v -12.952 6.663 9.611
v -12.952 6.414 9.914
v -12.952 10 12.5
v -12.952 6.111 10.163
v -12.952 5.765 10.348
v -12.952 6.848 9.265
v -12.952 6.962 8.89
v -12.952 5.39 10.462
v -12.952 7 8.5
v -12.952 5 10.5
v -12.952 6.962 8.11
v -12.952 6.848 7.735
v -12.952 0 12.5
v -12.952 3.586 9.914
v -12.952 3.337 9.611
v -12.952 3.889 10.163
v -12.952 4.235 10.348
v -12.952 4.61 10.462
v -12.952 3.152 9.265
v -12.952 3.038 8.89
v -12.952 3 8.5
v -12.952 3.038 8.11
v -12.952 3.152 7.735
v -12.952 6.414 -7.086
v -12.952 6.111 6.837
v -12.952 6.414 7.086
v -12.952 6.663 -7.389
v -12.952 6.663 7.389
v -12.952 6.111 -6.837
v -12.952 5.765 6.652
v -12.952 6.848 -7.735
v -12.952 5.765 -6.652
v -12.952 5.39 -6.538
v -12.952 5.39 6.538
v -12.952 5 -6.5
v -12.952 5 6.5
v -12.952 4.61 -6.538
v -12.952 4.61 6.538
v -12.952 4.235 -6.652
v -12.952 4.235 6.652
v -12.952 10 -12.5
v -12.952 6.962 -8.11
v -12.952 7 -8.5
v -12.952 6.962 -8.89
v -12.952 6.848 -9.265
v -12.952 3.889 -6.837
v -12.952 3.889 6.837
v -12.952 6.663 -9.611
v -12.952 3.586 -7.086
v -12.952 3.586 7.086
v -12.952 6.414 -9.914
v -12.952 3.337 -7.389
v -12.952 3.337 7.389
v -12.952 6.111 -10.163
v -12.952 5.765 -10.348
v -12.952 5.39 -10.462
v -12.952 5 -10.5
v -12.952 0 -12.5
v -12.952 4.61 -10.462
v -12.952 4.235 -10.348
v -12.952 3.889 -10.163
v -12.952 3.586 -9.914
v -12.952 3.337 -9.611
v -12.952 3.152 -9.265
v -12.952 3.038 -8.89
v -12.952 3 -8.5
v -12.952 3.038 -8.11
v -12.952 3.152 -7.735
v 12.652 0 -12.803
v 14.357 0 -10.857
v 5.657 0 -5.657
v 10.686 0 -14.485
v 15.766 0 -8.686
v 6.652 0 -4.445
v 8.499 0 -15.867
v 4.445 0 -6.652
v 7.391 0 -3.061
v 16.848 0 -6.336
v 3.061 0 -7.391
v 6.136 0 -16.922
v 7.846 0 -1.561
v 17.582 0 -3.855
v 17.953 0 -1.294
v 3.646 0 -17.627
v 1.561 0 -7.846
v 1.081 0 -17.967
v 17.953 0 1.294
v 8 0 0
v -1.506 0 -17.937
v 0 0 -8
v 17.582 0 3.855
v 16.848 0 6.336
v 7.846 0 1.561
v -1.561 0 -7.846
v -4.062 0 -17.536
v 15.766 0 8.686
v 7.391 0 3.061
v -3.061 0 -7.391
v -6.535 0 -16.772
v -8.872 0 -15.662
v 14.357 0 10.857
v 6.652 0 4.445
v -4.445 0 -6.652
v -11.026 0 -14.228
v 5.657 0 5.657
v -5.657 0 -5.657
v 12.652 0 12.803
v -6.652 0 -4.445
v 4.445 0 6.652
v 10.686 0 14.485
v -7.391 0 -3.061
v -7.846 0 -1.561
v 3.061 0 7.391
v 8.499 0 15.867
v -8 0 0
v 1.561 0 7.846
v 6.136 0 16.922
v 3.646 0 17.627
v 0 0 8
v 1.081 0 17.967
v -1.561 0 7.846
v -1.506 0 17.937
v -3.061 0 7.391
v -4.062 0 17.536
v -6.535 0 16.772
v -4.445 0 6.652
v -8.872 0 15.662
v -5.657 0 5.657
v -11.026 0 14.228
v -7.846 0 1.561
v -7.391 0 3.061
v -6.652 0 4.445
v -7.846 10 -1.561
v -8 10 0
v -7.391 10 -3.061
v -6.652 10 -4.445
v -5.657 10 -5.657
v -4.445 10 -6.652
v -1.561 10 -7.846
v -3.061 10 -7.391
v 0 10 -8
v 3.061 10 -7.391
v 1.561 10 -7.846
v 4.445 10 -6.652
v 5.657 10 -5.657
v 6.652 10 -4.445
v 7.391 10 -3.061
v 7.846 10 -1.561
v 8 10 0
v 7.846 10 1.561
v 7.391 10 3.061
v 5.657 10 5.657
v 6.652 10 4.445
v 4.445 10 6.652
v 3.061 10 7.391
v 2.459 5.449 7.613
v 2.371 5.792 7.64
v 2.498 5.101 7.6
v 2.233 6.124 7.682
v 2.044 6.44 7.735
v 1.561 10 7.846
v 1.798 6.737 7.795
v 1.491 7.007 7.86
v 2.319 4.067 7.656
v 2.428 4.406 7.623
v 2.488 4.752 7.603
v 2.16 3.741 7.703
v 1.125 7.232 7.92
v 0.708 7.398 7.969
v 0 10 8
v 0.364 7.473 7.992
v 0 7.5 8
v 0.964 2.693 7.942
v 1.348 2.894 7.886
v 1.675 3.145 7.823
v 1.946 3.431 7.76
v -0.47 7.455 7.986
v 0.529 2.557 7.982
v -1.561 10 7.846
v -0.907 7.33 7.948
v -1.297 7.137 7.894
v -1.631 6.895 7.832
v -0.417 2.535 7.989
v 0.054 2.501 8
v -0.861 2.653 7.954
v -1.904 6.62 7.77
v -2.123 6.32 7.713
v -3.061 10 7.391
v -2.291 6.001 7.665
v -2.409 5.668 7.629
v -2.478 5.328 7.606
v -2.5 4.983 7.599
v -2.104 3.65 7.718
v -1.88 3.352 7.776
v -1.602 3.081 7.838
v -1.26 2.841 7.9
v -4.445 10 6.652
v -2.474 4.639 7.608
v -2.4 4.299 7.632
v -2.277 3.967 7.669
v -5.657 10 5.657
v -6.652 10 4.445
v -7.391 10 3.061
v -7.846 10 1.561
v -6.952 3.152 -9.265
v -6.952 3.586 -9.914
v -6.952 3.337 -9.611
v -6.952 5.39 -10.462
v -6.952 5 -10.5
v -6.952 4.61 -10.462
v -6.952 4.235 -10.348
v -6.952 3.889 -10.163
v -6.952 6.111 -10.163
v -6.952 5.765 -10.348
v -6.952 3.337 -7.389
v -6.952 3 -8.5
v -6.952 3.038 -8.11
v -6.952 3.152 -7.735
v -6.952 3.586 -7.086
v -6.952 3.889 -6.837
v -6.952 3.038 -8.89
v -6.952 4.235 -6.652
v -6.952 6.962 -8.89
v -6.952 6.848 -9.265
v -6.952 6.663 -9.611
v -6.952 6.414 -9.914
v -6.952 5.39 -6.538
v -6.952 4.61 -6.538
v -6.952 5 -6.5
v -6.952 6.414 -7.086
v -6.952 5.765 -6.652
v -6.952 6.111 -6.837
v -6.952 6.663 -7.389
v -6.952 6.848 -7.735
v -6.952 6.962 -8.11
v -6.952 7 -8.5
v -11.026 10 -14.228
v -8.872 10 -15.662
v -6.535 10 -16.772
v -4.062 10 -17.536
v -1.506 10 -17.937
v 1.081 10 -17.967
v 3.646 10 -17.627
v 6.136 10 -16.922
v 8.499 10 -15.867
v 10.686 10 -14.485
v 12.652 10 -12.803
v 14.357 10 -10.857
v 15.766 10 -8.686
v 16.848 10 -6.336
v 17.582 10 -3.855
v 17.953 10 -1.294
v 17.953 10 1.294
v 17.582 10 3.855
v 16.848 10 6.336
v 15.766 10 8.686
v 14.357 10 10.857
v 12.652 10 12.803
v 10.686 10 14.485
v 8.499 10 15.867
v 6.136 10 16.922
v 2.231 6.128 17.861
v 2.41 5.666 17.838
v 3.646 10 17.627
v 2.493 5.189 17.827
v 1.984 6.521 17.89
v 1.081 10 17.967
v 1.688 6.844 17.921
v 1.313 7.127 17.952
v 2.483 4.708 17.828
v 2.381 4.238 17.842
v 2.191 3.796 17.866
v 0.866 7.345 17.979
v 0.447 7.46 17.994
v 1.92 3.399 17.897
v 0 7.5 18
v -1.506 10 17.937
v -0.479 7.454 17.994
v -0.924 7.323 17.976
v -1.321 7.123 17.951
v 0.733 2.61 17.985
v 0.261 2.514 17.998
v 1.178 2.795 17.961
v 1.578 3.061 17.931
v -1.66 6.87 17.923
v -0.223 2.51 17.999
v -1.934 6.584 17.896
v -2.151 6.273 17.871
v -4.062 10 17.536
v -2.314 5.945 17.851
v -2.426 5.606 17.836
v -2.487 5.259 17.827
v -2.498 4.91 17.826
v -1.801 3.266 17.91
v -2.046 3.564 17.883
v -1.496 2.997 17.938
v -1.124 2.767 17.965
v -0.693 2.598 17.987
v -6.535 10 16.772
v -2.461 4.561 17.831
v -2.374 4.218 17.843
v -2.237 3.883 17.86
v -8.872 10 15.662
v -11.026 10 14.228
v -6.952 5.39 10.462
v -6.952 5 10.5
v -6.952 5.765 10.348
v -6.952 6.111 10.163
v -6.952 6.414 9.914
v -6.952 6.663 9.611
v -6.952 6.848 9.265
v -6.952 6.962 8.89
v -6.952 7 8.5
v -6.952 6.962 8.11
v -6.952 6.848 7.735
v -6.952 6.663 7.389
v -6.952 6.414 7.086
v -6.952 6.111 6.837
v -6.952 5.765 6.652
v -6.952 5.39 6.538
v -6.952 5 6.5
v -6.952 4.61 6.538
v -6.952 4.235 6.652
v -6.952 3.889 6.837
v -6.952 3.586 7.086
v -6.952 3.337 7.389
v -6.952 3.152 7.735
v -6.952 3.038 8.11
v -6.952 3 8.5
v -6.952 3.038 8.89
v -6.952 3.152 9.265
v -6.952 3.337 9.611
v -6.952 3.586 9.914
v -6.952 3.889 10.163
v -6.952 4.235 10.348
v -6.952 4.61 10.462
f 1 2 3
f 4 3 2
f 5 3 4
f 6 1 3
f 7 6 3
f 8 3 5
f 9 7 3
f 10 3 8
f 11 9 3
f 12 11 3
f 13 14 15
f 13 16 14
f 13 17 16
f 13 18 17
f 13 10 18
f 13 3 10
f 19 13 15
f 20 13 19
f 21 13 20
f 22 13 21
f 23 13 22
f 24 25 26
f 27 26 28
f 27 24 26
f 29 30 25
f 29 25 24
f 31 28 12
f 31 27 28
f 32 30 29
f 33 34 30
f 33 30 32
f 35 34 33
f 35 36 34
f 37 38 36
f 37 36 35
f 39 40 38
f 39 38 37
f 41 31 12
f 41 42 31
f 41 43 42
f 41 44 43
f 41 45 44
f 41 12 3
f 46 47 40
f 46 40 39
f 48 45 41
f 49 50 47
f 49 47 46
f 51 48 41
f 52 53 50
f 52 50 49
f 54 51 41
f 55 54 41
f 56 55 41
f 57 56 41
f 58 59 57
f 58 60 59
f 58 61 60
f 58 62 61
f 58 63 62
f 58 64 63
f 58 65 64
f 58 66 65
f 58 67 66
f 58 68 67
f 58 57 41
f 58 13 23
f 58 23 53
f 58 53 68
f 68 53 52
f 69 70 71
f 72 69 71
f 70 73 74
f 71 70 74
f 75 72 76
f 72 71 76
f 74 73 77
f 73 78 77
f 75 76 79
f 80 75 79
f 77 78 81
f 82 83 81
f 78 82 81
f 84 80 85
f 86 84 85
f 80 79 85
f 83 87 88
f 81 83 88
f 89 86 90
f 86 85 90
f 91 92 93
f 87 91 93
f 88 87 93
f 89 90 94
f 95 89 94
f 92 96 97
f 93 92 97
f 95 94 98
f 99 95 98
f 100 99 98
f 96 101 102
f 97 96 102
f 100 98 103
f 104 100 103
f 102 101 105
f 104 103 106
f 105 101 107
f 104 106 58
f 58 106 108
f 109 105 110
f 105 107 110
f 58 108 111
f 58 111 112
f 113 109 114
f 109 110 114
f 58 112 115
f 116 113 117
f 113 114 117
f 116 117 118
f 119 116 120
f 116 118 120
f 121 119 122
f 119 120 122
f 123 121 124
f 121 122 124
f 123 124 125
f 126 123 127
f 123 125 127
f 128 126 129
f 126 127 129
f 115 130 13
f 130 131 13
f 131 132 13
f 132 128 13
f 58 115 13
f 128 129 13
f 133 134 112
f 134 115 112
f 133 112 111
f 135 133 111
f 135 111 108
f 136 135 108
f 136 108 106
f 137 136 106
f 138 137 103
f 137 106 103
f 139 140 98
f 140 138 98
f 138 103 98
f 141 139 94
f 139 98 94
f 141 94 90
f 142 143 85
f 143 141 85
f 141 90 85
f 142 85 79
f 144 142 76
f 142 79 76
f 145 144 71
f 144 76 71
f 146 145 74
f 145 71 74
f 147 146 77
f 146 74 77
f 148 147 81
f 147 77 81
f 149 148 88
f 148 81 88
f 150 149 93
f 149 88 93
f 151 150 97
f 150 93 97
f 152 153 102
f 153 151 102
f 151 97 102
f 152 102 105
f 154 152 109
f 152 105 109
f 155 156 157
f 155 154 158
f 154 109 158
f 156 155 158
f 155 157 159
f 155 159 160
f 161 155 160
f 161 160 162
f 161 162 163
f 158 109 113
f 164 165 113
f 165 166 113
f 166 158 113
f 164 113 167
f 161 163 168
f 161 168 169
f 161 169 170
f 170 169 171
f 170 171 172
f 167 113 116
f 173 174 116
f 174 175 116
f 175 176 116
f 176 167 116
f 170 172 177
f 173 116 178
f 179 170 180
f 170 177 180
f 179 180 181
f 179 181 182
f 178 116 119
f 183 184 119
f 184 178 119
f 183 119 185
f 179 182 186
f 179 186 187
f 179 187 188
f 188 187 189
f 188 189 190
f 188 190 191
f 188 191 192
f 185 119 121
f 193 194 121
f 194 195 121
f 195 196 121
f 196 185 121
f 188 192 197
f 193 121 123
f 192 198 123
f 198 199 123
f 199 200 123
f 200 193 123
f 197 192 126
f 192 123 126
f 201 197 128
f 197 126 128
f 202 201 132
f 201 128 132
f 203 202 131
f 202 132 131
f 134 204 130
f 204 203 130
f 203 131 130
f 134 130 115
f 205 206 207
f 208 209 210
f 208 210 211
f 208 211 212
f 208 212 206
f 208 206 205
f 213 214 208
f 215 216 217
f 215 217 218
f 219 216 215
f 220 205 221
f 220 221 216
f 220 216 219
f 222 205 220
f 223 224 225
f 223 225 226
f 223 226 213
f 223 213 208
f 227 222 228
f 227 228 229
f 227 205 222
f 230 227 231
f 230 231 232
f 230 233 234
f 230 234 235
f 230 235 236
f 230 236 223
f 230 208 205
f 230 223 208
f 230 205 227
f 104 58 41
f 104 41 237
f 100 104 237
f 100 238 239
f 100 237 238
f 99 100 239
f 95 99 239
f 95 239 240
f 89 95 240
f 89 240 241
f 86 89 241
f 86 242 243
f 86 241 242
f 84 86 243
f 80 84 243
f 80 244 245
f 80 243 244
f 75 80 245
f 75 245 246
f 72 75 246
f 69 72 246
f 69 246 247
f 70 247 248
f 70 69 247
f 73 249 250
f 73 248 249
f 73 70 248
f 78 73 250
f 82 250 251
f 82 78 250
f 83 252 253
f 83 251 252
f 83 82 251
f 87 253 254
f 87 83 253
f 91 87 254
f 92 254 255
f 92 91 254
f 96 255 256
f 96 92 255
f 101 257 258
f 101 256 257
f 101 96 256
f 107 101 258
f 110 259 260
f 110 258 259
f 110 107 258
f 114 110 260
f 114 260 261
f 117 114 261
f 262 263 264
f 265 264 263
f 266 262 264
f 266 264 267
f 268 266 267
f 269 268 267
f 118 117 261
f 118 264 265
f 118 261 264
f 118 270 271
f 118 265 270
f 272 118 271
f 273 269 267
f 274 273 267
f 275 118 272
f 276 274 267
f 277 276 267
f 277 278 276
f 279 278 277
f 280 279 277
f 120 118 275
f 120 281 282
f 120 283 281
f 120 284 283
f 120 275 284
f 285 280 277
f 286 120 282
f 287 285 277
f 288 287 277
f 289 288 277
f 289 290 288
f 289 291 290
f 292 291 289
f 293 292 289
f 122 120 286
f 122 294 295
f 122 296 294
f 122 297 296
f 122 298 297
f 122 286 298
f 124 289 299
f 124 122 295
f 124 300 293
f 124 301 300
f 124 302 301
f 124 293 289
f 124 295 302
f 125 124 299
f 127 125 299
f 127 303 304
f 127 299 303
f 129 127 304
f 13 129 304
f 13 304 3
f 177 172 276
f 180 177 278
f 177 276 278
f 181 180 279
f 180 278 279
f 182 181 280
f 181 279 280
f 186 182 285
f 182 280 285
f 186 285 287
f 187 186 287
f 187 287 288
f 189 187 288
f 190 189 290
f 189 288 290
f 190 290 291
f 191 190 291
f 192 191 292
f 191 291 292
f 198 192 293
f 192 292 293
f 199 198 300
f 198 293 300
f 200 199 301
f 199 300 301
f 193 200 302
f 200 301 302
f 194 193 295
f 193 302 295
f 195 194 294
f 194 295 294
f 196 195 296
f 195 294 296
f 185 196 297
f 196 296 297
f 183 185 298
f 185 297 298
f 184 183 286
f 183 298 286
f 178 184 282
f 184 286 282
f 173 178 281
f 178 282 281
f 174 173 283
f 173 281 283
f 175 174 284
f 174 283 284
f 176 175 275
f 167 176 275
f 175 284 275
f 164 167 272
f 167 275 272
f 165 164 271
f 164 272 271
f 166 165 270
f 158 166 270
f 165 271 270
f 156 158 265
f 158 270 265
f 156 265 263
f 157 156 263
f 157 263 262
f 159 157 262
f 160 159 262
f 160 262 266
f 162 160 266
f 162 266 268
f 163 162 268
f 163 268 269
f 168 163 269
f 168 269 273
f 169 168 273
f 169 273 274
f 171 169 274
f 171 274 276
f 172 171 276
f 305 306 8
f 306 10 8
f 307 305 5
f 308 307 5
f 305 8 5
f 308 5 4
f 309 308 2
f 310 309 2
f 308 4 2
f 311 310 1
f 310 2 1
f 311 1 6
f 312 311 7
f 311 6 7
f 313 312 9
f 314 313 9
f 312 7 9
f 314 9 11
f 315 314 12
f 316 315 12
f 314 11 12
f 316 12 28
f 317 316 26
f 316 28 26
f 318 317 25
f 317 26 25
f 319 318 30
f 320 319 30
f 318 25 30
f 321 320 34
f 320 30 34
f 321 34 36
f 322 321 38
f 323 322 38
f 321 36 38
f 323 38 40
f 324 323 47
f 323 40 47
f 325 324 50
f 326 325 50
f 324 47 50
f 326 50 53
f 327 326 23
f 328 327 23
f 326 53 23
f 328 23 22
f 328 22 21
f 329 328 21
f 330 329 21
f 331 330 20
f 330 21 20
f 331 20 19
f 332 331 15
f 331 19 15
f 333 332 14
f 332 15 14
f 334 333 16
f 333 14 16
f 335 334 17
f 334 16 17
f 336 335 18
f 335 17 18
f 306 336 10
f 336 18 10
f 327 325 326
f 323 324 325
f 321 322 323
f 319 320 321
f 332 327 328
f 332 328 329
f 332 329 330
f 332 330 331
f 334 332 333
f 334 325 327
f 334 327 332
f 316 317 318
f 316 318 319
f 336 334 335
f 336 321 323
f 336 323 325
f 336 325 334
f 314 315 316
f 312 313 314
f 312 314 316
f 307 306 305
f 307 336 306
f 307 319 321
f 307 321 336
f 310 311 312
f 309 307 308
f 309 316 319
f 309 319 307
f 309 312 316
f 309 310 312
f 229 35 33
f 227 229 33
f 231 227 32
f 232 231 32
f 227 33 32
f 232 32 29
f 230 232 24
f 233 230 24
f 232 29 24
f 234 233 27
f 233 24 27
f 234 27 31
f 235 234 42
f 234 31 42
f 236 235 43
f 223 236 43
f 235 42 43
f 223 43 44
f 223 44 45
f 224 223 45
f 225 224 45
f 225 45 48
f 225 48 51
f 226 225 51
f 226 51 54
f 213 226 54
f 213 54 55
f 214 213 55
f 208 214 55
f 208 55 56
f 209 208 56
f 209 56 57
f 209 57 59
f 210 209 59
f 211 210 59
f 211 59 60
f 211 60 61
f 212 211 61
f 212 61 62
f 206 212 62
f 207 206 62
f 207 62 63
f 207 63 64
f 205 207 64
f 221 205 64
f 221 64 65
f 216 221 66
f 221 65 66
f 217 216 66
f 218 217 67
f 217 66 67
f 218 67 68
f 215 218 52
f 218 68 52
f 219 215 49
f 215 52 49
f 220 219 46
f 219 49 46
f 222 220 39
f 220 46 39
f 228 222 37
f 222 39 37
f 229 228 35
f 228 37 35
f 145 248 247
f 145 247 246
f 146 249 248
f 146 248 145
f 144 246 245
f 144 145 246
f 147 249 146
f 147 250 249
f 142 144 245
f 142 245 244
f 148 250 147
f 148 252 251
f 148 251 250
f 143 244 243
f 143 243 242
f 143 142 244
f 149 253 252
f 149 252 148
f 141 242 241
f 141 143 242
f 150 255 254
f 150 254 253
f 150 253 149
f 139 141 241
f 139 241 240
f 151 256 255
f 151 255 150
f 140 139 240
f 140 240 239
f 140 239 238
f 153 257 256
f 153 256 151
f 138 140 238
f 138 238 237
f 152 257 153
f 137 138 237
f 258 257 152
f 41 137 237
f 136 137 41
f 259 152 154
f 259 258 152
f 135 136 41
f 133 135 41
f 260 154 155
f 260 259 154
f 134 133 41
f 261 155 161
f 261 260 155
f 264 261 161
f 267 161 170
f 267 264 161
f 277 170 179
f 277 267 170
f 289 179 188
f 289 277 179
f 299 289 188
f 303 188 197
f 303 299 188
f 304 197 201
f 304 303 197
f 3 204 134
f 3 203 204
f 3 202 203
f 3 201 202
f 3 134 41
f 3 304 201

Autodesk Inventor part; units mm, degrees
ref_plane "XZ Plane" through (0, 0, 0) normal (0, 1, 0) x (-1, 0, 0)
ref_plane "XY Plane" through (0, 0, 0) normal (0, 0, 1) x (1, 0, 0)
sketch "Sketch1" plane through (0, 0, 0) normal (0, 1, 0) x (-1, 0, 0)
  circle A0 centre (0, 0) radius 8
  arc A1 (12.9518, 12.5) -> (12.9518, -12.5) centre (0, 0) ccw
  line L0 (12.9518, 12.5) -> (12.9518, -12.5)
  dimension "d0" = 16
  dimension "d13" = 36
  dimension "d14" = 25
extrude "Extrusion2" add sketch "Sketch1" along normal blind 10
sketch "Sketch3" plane through (-12.9518, 0, -12.5) normal (-1, 0, 0) x (0, 0, 1)
  circle A0 centre (21, 5) radius 2
  circle A1 centre (4, 5) radius 2
  line L0 (36, 5) -> (-7, 5) construction
  line L1 (25, 0) -> (0, 0) projected
  line L2 (25, 0) -> (25, 10) projected
  line L3 (0, 0) -> (0, 10) projected
  point P0 (12.5, 0)
  dimension "d17" = 4
  dimension "d18" = 4
  dimension "d19" = 5
  dimension "d20" = 17
  dimension "d21" = 4
  dimension "d22" = 25
extrude "Extrusion3" cut sketch "Sketch3" against normal blind 6
ref_plane "Work Plane2" through (0, 0, 0) normal (0, 0, -1) x (0, 1, 0)
sketch "Sketch4" plane through (0, 0, 0) normal (0, 0, -1) x (0, 1, 0)
  circle A0 centre (5, 0) radius 2.5
  point P0 (0, 0)
  dimension "d26" = 5
hole "Hole1" at (0, 5, 0) direction (0, 0, 1) diameter 5 end through all
equation "\"d21\" = -0.5 * d20 + 0.5 * d22"
properties part number "mocowanie uchwytu01"
